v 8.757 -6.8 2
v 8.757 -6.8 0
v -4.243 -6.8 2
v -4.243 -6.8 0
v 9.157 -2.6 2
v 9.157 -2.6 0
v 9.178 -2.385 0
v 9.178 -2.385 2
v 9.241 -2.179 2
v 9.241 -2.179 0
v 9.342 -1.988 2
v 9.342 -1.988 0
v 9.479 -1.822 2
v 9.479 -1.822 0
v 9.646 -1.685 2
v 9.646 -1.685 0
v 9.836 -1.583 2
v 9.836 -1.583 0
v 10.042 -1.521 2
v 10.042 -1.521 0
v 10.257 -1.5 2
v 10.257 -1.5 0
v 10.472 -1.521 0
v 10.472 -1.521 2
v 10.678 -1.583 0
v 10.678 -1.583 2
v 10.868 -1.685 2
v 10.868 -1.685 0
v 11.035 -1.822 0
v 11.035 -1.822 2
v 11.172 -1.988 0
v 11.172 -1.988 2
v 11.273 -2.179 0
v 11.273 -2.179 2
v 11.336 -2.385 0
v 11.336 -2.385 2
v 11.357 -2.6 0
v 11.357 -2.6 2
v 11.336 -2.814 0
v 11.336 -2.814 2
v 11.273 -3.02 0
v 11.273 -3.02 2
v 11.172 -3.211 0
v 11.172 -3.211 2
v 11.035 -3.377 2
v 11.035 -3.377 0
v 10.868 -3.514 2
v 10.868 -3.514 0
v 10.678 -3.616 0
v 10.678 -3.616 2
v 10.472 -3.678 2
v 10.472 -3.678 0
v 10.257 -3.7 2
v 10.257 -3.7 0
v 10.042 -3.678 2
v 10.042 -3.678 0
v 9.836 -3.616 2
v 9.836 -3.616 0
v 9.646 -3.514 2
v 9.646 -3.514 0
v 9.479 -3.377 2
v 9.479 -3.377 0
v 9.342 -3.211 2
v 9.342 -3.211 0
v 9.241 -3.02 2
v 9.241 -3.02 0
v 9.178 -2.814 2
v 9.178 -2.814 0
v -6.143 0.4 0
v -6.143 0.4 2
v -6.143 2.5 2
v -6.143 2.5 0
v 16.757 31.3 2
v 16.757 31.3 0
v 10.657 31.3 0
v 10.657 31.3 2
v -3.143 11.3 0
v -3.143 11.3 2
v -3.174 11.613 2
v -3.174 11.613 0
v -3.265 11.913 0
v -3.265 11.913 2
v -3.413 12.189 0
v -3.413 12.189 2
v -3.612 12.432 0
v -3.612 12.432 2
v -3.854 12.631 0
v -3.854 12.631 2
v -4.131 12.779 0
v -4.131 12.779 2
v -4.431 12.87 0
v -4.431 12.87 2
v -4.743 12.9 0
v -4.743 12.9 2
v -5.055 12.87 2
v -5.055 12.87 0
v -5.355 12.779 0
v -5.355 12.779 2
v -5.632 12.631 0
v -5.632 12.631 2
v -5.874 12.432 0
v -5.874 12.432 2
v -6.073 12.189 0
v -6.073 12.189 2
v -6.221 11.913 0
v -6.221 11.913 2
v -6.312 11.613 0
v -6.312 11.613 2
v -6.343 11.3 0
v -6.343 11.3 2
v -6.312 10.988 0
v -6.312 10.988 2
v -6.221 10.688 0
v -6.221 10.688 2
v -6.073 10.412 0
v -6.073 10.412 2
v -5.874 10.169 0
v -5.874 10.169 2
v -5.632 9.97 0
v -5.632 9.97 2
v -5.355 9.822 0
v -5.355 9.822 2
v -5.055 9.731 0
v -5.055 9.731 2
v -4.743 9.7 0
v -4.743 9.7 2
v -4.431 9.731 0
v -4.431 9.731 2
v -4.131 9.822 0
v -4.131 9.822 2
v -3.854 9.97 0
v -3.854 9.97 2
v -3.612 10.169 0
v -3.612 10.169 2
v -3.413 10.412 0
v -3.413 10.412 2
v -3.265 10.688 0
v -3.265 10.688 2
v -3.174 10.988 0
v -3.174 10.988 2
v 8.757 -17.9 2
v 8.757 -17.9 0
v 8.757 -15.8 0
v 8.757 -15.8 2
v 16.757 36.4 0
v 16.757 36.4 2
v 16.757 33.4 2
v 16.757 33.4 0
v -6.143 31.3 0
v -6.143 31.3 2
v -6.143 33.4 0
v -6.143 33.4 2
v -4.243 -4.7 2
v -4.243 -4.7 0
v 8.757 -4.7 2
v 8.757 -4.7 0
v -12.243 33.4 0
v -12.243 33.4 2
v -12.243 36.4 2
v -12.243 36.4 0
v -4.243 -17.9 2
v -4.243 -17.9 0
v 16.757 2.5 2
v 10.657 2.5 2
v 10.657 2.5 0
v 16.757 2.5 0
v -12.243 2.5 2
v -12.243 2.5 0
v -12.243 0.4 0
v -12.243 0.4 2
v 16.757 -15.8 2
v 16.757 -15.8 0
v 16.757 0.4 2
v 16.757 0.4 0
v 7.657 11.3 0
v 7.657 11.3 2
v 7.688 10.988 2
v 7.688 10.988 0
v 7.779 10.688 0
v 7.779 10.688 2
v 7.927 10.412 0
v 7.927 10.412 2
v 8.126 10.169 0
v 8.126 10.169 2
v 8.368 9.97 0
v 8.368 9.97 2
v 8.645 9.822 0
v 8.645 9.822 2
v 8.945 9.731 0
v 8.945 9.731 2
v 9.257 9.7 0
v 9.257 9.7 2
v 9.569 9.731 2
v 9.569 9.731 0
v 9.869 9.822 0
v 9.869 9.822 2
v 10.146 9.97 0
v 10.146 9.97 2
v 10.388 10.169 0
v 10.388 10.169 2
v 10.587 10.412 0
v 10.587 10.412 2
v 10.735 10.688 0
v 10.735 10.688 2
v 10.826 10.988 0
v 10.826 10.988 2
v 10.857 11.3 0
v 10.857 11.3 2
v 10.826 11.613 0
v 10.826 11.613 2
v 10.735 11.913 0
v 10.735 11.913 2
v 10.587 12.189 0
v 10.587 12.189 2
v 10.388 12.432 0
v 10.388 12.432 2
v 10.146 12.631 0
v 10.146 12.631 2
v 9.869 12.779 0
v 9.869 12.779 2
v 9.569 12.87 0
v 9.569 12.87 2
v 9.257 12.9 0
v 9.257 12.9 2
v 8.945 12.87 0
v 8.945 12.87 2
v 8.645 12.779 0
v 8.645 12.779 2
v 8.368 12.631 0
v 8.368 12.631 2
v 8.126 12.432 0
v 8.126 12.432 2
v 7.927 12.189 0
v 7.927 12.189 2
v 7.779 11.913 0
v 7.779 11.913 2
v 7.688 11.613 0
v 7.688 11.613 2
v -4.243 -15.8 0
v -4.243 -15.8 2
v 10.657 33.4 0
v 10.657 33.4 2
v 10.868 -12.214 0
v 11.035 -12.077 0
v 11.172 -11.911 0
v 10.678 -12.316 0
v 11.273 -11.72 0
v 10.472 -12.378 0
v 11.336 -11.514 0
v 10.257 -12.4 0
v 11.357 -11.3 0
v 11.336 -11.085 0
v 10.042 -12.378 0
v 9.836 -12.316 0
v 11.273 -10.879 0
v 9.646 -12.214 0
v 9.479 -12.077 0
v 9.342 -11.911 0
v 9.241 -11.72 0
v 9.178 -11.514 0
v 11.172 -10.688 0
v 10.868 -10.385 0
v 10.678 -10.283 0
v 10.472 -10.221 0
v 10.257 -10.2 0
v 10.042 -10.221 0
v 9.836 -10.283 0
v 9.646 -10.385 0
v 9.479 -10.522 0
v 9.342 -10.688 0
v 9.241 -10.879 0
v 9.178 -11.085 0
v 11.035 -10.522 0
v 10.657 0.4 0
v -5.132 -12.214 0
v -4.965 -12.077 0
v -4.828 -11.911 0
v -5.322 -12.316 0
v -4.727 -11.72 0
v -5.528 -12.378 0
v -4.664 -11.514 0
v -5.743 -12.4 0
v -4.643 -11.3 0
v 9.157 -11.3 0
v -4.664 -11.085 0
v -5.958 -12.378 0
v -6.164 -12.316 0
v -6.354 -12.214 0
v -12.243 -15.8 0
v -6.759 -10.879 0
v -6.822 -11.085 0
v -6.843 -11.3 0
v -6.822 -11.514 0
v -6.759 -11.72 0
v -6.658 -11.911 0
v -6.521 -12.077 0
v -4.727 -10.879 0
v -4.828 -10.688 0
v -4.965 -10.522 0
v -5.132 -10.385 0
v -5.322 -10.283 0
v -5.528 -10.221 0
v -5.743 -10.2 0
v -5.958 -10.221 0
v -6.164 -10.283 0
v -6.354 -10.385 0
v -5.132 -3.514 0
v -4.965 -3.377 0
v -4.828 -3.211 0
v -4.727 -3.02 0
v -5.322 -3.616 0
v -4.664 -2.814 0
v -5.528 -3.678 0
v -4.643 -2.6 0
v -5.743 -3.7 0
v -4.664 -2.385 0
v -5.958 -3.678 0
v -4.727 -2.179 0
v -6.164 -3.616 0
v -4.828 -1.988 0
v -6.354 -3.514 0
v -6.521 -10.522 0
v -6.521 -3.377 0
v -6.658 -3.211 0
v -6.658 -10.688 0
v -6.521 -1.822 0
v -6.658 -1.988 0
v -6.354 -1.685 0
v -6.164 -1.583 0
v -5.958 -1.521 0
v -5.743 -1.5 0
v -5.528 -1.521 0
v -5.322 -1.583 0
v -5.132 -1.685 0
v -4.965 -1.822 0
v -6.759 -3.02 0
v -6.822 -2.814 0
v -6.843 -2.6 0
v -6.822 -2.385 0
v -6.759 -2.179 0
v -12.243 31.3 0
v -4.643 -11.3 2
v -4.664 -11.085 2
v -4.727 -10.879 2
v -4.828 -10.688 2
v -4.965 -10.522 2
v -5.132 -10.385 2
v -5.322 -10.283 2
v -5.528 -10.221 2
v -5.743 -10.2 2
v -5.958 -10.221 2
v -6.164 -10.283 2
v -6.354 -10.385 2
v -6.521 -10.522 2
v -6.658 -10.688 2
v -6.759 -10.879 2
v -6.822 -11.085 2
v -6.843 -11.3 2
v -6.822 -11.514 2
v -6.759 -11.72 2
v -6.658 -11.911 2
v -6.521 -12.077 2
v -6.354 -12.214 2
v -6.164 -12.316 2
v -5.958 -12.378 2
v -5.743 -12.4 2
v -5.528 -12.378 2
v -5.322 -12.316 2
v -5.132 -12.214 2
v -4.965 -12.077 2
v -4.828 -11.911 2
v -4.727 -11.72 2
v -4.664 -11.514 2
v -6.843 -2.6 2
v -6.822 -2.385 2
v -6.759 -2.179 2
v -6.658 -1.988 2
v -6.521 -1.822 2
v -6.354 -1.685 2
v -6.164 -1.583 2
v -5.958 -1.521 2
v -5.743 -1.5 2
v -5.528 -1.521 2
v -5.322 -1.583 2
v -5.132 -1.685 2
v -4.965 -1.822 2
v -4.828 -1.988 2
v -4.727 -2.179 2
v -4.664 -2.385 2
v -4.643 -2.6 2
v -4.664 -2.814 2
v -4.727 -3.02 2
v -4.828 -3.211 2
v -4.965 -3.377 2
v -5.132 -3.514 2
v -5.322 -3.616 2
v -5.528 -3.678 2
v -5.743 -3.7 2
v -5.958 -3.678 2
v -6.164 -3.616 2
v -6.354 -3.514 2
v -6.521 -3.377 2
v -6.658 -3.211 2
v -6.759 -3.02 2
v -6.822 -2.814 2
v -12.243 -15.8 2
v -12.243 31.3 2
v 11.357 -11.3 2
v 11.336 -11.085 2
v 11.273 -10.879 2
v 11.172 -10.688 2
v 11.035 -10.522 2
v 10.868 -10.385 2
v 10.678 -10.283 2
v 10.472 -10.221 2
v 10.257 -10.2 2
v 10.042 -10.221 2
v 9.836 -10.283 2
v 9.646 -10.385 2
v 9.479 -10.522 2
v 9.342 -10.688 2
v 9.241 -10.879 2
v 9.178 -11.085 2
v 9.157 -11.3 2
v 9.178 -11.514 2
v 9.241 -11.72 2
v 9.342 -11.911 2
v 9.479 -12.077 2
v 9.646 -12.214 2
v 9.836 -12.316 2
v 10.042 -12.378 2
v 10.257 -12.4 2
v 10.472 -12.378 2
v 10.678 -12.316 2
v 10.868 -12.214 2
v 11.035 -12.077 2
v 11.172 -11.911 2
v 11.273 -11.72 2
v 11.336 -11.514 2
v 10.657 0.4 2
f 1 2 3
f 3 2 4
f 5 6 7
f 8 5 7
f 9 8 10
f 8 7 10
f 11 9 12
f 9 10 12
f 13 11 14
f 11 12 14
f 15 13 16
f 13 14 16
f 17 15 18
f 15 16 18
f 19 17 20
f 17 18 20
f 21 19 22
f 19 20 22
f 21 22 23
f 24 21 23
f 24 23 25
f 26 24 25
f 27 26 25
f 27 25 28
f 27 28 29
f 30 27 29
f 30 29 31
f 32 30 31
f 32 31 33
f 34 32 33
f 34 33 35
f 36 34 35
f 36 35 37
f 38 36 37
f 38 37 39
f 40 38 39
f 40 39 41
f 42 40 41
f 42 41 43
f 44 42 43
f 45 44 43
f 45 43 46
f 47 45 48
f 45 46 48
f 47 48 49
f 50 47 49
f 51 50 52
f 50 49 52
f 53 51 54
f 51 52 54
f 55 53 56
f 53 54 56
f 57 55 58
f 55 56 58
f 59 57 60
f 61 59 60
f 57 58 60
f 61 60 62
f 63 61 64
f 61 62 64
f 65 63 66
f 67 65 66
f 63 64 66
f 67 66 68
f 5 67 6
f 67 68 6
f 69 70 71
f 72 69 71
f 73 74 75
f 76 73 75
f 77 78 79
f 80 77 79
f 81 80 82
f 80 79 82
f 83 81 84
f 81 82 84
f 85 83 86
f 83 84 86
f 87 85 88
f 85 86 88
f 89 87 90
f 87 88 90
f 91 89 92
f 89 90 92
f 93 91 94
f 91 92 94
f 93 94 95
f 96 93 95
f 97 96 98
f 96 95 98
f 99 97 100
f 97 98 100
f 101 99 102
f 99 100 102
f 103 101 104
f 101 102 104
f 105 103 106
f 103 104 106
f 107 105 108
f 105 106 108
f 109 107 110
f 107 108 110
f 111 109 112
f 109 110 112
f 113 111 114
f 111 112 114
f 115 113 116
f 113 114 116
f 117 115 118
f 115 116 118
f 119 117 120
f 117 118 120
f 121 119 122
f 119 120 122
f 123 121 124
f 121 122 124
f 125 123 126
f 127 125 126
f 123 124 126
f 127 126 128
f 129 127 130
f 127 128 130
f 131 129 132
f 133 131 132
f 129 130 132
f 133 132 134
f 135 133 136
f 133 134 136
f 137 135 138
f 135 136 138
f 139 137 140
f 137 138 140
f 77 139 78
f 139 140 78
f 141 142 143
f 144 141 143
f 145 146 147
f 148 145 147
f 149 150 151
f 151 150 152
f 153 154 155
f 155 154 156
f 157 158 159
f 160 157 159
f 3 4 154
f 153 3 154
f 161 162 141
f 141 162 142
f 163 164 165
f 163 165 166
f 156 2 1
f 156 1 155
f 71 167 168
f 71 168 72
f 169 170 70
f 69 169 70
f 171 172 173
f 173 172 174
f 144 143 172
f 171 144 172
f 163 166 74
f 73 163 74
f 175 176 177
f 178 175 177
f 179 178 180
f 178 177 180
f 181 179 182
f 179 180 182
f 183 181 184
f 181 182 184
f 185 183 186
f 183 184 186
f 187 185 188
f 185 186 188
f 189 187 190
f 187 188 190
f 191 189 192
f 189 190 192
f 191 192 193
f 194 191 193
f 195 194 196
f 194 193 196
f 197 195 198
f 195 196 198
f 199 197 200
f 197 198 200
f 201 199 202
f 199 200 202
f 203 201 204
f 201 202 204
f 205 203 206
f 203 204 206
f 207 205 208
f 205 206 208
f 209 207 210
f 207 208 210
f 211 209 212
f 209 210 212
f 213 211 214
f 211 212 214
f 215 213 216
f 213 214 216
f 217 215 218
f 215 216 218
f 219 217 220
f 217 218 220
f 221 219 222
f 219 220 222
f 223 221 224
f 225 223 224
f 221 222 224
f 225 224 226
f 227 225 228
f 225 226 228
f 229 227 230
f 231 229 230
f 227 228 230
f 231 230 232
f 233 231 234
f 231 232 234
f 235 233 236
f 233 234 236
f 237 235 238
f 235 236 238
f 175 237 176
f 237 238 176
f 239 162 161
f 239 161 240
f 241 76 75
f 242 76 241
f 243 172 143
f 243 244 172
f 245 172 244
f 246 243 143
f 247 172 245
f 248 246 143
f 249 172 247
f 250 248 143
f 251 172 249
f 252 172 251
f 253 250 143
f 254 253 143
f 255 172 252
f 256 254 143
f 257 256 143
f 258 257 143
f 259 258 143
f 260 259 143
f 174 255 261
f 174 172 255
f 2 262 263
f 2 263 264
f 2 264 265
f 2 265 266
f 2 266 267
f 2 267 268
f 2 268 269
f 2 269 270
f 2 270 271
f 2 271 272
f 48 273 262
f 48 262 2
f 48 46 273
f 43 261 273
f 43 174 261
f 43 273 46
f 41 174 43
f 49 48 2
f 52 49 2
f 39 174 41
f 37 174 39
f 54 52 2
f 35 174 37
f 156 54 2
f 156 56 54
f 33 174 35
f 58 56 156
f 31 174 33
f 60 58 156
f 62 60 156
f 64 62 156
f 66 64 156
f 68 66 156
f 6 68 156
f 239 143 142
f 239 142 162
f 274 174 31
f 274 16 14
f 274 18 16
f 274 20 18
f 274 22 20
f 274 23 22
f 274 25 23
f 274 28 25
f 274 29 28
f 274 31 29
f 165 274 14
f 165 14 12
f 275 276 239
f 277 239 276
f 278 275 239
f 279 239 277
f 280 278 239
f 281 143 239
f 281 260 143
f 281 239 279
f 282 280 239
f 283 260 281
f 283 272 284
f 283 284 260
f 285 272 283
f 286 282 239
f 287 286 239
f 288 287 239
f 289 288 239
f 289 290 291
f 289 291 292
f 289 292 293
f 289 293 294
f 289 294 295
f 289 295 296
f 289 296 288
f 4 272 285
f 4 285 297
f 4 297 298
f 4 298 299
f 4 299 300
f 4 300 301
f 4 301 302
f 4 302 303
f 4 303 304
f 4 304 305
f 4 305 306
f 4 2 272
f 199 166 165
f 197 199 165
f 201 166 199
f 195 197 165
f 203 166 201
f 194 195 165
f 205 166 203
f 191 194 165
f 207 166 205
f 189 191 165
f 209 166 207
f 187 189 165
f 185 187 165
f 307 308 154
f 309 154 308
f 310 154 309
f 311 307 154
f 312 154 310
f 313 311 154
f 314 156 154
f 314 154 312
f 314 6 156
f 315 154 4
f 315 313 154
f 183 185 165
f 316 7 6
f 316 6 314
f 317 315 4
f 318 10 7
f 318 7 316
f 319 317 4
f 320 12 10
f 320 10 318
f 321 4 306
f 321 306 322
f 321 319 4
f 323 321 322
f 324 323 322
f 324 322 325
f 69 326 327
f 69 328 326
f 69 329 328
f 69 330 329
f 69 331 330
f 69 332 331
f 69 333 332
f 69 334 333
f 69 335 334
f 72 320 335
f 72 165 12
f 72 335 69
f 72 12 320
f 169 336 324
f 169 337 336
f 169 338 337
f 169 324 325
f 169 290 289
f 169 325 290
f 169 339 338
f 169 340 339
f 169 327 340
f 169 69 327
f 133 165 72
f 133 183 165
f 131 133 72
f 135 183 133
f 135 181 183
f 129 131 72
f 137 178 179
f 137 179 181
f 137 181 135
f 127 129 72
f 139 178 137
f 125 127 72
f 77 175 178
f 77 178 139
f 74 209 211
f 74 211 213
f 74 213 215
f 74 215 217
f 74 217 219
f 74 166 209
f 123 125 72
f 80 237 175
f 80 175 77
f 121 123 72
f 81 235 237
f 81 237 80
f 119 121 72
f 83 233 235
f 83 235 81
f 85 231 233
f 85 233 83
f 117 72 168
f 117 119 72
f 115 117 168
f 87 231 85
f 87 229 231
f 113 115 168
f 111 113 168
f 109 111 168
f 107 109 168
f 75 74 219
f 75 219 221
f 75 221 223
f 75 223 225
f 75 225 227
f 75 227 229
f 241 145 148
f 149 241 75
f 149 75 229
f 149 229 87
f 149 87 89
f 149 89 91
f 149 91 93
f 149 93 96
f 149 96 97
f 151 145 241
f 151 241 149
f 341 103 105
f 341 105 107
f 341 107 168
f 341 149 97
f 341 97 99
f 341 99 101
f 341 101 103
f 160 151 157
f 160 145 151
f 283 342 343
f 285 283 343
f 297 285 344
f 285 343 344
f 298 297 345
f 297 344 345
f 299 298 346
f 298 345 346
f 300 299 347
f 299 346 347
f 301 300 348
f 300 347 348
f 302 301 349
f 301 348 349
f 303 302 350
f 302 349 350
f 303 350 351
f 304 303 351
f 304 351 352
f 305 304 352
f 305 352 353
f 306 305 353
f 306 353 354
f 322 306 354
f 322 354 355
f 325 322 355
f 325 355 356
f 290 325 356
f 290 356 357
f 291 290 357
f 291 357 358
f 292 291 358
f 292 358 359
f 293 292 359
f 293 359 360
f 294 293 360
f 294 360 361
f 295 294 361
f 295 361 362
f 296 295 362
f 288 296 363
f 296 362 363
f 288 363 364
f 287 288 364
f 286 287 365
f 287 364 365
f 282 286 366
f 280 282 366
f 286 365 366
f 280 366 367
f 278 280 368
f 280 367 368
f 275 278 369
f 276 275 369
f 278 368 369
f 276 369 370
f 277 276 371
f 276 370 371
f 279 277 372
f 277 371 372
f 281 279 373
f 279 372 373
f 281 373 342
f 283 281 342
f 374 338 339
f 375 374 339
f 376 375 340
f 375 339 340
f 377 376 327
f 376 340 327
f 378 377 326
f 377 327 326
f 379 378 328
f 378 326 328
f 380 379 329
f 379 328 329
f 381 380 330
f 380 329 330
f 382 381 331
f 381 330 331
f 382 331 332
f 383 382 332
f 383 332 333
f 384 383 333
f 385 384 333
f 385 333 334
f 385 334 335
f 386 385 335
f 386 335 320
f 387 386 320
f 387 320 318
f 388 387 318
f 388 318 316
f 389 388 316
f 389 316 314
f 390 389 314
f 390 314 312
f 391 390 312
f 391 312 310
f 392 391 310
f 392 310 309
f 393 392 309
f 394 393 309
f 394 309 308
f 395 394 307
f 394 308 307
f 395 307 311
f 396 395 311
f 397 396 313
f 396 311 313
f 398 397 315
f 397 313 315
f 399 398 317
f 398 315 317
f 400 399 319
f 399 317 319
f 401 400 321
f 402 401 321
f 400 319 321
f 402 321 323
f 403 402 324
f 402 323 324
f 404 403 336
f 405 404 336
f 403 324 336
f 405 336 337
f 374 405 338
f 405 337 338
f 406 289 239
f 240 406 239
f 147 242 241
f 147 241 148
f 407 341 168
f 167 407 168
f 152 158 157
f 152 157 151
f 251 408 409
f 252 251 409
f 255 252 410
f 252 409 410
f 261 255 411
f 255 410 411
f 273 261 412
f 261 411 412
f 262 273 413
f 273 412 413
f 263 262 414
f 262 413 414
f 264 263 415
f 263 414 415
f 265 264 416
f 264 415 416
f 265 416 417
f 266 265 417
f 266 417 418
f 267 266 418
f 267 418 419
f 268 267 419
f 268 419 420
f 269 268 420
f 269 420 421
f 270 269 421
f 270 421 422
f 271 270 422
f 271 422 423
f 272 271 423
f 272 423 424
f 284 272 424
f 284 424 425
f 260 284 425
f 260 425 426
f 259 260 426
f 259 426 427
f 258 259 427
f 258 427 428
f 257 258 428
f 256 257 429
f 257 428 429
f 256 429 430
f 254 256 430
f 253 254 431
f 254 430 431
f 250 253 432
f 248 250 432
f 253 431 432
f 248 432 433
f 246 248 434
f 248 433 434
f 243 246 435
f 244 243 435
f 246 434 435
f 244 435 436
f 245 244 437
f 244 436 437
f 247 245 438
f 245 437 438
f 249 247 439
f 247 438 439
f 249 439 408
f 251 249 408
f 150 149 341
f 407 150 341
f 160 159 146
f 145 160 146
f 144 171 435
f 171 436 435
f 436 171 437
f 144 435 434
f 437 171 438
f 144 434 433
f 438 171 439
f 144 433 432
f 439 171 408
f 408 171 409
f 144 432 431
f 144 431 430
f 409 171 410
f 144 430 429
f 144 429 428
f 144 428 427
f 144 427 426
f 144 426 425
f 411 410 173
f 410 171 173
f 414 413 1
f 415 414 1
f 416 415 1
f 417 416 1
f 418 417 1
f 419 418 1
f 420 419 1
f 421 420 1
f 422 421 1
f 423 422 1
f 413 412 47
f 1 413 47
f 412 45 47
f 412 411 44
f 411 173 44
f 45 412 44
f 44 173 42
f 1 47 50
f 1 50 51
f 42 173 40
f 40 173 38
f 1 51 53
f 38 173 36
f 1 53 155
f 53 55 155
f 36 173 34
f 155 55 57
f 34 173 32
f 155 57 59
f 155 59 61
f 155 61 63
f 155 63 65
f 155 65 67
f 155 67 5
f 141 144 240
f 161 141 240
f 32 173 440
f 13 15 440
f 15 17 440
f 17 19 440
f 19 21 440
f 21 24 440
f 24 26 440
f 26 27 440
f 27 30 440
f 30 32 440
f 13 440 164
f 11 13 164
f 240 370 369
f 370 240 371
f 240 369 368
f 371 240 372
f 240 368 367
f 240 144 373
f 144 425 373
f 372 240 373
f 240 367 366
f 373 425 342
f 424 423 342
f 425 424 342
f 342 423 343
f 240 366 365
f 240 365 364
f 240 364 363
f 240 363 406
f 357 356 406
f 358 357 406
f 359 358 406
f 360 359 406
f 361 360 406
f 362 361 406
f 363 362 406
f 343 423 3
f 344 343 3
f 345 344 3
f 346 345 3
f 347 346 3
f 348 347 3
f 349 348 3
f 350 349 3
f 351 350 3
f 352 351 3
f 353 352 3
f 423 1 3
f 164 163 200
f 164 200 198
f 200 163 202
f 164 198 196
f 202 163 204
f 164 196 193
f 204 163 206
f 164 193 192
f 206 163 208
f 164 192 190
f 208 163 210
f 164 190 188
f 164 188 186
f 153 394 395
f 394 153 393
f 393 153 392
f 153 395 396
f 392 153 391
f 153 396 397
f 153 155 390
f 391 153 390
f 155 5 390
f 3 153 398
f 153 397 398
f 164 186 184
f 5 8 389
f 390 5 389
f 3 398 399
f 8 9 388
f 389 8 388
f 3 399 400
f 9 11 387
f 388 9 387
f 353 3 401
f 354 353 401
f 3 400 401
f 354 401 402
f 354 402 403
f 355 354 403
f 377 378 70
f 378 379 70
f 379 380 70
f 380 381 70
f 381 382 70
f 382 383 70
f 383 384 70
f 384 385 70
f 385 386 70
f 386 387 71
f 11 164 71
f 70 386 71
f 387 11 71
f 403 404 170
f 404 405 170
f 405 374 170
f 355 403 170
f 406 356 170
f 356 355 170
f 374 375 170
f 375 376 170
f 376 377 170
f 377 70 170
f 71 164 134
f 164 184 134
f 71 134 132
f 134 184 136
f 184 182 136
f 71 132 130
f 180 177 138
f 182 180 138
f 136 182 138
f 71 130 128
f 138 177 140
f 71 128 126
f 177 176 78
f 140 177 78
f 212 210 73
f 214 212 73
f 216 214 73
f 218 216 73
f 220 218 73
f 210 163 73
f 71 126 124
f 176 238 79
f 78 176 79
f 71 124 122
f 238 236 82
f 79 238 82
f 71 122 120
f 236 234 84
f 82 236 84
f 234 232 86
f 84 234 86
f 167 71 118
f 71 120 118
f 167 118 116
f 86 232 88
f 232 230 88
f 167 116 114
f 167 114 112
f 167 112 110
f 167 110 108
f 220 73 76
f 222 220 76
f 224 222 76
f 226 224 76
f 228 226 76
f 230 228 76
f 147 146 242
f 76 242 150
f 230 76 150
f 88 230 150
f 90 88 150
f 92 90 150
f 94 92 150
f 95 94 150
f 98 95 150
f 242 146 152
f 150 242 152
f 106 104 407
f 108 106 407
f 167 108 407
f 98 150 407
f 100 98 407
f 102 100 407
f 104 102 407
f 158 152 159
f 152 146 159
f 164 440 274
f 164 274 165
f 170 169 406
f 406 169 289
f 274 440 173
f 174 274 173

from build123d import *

# Parameters (mm, degrees)
SKETCH_1_W          = 8
SKETCH_1_H          = 2.1
SKETCH_1_W_2        = 13
EXTRUDE_1_DEPTH     = 2
SKETCH_2_W          = 6.1
SKETCH_2_H          = 2.1
CUT_EXTRUDE_1_DEPTH = 2
SKETCH_3_W          = 16.8
SKETCH_3_H          = 2.1
EXTRUDE_2_DEPTH     = 2
SKETCH_4_R          = 1.6
CUT_EXTRUDE_2_DEPTH = 2
SKETCH_5_R          = 1.1
CUT_EXTRUDE_5_DEPTH = 10
SKETCH_6_R          = 1.1
CUT_EXTRUDE_6_DEPTH = 10
EXTRUDE_3_DEPTH     = 2


with BuildPart() as part:
    # 草图1 → 凸台-拉伸1 (new body)
    with BuildSketch(Plane.XY):
        Polygon((-12.242924528, 31.300471698), (-12.242924528, -4.699528302), (-4.242924528, -4.699528302), (8.757075472, -4.699528302), (16.757075472, -4.699528302), (16.757075472, 31.300471698), align=None)
        Polygon((-12.242924528, -6.799528302), (-12.242924528, -15.799528302), (-4.242924528, -15.799528302), (8.757075472, -15.799528302), (16.757075472, -15.799528302), (16.757075472, -6.799528302), (8.757075472, -6.799528302), (-4.242924528, -6.799528302), align=None)
        with Locations((12.757075472, -5.749528302)):
            Rectangle(SKETCH_1_W, SKETCH_1_H)
        with Locations((-8.242924528, -5.749528302)):
            Rectangle(SKETCH_1_W, SKETCH_1_H)
        with Locations((2.257075472, -16.849528302)):
            Rectangle(SKETCH_1_W_2, SKETCH_1_H)
    extrude(amount=EXTRUDE_1_DEPTH)

    # 草图2 → 切除-拉伸1 (cut)
    with BuildSketch(Plane.XY.offset(2)):
        with Locations((13.707075472, 1.450471698)):
            Rectangle(SKETCH_2_W, SKETCH_2_H)
        with Locations((-9.192924528, 1.450471698)):
            Rectangle(SKETCH_2_W, SKETCH_2_H)
    extrude(amount=-CUT_EXTRUDE_1_DEPTH, mode=Mode.SUBTRACT)

    # 草图3 → 凸台-拉伸2 (add)
    with BuildSketch(Plane.XY.offset(2)):
        with Locations((2.257075472, 32.350471698)):
            Rectangle(SKETCH_3_W, SKETCH_3_H)
    extrude(amount=-EXTRUDE_2_DEPTH)

    # 草图4 → 切除-拉伸2 (cut)
    with BuildSketch(Plane.XY.offset(2)):
        with Locations((-4.742924528, 11.300471698)):
            Circle(SKETCH_4_R)
        with Locations(Location((9.257075472, 11.300471698, 0), (0, 0, 180))):
            Circle(SKETCH_4_R)
    extrude(amount=-CUT_EXTRUDE_2_DEPTH, mode=Mode.SUBTRACT)

    # 草图5 → 切除-拉伸5 (cut)
    with BuildSketch(Plane(origin=(0, 0, 0), x_dir=(-1, 0, 0), z_dir=(0, 0, -1))):
        with Locations((-10.257075472, -2.599528302)):
            Circle(SKETCH_5_R)
        with Locations((5.742924528, -2.599528302)):
            Circle(SKETCH_5_R)
    extrude(amount=-CUT_EXTRUDE_5_DEPTH, mode=Mode.SUBTRACT)

    # 草图6 → 切除-拉伸6 (cut)
    with BuildSketch(Plane.XY.offset(2)):
        with Locations((10.257075472, -11.299528302)):
            Circle(SKETCH_6_R)
        with Locations((-5.742924528, -11.299528302)):
            Circle(SKETCH_6_R)
    extrude(amount=-CUT_EXTRUDE_6_DEPTH, mode=Mode.SUBTRACT)

    # 草图7 → 凸台-拉伸3 (add)
    with BuildSketch(Plane.XY.offset(2)):
        Polygon((-6.142924528, 33.400471698), (-12.242924528, 33.400471698), (-12.242924528, 36.400471698), (16.757075472, 36.400471698), (16.757075472, 33.400471698), align=None)
    extrude(amount=-EXTRUDE_3_DEPTH)


solid = part.part
